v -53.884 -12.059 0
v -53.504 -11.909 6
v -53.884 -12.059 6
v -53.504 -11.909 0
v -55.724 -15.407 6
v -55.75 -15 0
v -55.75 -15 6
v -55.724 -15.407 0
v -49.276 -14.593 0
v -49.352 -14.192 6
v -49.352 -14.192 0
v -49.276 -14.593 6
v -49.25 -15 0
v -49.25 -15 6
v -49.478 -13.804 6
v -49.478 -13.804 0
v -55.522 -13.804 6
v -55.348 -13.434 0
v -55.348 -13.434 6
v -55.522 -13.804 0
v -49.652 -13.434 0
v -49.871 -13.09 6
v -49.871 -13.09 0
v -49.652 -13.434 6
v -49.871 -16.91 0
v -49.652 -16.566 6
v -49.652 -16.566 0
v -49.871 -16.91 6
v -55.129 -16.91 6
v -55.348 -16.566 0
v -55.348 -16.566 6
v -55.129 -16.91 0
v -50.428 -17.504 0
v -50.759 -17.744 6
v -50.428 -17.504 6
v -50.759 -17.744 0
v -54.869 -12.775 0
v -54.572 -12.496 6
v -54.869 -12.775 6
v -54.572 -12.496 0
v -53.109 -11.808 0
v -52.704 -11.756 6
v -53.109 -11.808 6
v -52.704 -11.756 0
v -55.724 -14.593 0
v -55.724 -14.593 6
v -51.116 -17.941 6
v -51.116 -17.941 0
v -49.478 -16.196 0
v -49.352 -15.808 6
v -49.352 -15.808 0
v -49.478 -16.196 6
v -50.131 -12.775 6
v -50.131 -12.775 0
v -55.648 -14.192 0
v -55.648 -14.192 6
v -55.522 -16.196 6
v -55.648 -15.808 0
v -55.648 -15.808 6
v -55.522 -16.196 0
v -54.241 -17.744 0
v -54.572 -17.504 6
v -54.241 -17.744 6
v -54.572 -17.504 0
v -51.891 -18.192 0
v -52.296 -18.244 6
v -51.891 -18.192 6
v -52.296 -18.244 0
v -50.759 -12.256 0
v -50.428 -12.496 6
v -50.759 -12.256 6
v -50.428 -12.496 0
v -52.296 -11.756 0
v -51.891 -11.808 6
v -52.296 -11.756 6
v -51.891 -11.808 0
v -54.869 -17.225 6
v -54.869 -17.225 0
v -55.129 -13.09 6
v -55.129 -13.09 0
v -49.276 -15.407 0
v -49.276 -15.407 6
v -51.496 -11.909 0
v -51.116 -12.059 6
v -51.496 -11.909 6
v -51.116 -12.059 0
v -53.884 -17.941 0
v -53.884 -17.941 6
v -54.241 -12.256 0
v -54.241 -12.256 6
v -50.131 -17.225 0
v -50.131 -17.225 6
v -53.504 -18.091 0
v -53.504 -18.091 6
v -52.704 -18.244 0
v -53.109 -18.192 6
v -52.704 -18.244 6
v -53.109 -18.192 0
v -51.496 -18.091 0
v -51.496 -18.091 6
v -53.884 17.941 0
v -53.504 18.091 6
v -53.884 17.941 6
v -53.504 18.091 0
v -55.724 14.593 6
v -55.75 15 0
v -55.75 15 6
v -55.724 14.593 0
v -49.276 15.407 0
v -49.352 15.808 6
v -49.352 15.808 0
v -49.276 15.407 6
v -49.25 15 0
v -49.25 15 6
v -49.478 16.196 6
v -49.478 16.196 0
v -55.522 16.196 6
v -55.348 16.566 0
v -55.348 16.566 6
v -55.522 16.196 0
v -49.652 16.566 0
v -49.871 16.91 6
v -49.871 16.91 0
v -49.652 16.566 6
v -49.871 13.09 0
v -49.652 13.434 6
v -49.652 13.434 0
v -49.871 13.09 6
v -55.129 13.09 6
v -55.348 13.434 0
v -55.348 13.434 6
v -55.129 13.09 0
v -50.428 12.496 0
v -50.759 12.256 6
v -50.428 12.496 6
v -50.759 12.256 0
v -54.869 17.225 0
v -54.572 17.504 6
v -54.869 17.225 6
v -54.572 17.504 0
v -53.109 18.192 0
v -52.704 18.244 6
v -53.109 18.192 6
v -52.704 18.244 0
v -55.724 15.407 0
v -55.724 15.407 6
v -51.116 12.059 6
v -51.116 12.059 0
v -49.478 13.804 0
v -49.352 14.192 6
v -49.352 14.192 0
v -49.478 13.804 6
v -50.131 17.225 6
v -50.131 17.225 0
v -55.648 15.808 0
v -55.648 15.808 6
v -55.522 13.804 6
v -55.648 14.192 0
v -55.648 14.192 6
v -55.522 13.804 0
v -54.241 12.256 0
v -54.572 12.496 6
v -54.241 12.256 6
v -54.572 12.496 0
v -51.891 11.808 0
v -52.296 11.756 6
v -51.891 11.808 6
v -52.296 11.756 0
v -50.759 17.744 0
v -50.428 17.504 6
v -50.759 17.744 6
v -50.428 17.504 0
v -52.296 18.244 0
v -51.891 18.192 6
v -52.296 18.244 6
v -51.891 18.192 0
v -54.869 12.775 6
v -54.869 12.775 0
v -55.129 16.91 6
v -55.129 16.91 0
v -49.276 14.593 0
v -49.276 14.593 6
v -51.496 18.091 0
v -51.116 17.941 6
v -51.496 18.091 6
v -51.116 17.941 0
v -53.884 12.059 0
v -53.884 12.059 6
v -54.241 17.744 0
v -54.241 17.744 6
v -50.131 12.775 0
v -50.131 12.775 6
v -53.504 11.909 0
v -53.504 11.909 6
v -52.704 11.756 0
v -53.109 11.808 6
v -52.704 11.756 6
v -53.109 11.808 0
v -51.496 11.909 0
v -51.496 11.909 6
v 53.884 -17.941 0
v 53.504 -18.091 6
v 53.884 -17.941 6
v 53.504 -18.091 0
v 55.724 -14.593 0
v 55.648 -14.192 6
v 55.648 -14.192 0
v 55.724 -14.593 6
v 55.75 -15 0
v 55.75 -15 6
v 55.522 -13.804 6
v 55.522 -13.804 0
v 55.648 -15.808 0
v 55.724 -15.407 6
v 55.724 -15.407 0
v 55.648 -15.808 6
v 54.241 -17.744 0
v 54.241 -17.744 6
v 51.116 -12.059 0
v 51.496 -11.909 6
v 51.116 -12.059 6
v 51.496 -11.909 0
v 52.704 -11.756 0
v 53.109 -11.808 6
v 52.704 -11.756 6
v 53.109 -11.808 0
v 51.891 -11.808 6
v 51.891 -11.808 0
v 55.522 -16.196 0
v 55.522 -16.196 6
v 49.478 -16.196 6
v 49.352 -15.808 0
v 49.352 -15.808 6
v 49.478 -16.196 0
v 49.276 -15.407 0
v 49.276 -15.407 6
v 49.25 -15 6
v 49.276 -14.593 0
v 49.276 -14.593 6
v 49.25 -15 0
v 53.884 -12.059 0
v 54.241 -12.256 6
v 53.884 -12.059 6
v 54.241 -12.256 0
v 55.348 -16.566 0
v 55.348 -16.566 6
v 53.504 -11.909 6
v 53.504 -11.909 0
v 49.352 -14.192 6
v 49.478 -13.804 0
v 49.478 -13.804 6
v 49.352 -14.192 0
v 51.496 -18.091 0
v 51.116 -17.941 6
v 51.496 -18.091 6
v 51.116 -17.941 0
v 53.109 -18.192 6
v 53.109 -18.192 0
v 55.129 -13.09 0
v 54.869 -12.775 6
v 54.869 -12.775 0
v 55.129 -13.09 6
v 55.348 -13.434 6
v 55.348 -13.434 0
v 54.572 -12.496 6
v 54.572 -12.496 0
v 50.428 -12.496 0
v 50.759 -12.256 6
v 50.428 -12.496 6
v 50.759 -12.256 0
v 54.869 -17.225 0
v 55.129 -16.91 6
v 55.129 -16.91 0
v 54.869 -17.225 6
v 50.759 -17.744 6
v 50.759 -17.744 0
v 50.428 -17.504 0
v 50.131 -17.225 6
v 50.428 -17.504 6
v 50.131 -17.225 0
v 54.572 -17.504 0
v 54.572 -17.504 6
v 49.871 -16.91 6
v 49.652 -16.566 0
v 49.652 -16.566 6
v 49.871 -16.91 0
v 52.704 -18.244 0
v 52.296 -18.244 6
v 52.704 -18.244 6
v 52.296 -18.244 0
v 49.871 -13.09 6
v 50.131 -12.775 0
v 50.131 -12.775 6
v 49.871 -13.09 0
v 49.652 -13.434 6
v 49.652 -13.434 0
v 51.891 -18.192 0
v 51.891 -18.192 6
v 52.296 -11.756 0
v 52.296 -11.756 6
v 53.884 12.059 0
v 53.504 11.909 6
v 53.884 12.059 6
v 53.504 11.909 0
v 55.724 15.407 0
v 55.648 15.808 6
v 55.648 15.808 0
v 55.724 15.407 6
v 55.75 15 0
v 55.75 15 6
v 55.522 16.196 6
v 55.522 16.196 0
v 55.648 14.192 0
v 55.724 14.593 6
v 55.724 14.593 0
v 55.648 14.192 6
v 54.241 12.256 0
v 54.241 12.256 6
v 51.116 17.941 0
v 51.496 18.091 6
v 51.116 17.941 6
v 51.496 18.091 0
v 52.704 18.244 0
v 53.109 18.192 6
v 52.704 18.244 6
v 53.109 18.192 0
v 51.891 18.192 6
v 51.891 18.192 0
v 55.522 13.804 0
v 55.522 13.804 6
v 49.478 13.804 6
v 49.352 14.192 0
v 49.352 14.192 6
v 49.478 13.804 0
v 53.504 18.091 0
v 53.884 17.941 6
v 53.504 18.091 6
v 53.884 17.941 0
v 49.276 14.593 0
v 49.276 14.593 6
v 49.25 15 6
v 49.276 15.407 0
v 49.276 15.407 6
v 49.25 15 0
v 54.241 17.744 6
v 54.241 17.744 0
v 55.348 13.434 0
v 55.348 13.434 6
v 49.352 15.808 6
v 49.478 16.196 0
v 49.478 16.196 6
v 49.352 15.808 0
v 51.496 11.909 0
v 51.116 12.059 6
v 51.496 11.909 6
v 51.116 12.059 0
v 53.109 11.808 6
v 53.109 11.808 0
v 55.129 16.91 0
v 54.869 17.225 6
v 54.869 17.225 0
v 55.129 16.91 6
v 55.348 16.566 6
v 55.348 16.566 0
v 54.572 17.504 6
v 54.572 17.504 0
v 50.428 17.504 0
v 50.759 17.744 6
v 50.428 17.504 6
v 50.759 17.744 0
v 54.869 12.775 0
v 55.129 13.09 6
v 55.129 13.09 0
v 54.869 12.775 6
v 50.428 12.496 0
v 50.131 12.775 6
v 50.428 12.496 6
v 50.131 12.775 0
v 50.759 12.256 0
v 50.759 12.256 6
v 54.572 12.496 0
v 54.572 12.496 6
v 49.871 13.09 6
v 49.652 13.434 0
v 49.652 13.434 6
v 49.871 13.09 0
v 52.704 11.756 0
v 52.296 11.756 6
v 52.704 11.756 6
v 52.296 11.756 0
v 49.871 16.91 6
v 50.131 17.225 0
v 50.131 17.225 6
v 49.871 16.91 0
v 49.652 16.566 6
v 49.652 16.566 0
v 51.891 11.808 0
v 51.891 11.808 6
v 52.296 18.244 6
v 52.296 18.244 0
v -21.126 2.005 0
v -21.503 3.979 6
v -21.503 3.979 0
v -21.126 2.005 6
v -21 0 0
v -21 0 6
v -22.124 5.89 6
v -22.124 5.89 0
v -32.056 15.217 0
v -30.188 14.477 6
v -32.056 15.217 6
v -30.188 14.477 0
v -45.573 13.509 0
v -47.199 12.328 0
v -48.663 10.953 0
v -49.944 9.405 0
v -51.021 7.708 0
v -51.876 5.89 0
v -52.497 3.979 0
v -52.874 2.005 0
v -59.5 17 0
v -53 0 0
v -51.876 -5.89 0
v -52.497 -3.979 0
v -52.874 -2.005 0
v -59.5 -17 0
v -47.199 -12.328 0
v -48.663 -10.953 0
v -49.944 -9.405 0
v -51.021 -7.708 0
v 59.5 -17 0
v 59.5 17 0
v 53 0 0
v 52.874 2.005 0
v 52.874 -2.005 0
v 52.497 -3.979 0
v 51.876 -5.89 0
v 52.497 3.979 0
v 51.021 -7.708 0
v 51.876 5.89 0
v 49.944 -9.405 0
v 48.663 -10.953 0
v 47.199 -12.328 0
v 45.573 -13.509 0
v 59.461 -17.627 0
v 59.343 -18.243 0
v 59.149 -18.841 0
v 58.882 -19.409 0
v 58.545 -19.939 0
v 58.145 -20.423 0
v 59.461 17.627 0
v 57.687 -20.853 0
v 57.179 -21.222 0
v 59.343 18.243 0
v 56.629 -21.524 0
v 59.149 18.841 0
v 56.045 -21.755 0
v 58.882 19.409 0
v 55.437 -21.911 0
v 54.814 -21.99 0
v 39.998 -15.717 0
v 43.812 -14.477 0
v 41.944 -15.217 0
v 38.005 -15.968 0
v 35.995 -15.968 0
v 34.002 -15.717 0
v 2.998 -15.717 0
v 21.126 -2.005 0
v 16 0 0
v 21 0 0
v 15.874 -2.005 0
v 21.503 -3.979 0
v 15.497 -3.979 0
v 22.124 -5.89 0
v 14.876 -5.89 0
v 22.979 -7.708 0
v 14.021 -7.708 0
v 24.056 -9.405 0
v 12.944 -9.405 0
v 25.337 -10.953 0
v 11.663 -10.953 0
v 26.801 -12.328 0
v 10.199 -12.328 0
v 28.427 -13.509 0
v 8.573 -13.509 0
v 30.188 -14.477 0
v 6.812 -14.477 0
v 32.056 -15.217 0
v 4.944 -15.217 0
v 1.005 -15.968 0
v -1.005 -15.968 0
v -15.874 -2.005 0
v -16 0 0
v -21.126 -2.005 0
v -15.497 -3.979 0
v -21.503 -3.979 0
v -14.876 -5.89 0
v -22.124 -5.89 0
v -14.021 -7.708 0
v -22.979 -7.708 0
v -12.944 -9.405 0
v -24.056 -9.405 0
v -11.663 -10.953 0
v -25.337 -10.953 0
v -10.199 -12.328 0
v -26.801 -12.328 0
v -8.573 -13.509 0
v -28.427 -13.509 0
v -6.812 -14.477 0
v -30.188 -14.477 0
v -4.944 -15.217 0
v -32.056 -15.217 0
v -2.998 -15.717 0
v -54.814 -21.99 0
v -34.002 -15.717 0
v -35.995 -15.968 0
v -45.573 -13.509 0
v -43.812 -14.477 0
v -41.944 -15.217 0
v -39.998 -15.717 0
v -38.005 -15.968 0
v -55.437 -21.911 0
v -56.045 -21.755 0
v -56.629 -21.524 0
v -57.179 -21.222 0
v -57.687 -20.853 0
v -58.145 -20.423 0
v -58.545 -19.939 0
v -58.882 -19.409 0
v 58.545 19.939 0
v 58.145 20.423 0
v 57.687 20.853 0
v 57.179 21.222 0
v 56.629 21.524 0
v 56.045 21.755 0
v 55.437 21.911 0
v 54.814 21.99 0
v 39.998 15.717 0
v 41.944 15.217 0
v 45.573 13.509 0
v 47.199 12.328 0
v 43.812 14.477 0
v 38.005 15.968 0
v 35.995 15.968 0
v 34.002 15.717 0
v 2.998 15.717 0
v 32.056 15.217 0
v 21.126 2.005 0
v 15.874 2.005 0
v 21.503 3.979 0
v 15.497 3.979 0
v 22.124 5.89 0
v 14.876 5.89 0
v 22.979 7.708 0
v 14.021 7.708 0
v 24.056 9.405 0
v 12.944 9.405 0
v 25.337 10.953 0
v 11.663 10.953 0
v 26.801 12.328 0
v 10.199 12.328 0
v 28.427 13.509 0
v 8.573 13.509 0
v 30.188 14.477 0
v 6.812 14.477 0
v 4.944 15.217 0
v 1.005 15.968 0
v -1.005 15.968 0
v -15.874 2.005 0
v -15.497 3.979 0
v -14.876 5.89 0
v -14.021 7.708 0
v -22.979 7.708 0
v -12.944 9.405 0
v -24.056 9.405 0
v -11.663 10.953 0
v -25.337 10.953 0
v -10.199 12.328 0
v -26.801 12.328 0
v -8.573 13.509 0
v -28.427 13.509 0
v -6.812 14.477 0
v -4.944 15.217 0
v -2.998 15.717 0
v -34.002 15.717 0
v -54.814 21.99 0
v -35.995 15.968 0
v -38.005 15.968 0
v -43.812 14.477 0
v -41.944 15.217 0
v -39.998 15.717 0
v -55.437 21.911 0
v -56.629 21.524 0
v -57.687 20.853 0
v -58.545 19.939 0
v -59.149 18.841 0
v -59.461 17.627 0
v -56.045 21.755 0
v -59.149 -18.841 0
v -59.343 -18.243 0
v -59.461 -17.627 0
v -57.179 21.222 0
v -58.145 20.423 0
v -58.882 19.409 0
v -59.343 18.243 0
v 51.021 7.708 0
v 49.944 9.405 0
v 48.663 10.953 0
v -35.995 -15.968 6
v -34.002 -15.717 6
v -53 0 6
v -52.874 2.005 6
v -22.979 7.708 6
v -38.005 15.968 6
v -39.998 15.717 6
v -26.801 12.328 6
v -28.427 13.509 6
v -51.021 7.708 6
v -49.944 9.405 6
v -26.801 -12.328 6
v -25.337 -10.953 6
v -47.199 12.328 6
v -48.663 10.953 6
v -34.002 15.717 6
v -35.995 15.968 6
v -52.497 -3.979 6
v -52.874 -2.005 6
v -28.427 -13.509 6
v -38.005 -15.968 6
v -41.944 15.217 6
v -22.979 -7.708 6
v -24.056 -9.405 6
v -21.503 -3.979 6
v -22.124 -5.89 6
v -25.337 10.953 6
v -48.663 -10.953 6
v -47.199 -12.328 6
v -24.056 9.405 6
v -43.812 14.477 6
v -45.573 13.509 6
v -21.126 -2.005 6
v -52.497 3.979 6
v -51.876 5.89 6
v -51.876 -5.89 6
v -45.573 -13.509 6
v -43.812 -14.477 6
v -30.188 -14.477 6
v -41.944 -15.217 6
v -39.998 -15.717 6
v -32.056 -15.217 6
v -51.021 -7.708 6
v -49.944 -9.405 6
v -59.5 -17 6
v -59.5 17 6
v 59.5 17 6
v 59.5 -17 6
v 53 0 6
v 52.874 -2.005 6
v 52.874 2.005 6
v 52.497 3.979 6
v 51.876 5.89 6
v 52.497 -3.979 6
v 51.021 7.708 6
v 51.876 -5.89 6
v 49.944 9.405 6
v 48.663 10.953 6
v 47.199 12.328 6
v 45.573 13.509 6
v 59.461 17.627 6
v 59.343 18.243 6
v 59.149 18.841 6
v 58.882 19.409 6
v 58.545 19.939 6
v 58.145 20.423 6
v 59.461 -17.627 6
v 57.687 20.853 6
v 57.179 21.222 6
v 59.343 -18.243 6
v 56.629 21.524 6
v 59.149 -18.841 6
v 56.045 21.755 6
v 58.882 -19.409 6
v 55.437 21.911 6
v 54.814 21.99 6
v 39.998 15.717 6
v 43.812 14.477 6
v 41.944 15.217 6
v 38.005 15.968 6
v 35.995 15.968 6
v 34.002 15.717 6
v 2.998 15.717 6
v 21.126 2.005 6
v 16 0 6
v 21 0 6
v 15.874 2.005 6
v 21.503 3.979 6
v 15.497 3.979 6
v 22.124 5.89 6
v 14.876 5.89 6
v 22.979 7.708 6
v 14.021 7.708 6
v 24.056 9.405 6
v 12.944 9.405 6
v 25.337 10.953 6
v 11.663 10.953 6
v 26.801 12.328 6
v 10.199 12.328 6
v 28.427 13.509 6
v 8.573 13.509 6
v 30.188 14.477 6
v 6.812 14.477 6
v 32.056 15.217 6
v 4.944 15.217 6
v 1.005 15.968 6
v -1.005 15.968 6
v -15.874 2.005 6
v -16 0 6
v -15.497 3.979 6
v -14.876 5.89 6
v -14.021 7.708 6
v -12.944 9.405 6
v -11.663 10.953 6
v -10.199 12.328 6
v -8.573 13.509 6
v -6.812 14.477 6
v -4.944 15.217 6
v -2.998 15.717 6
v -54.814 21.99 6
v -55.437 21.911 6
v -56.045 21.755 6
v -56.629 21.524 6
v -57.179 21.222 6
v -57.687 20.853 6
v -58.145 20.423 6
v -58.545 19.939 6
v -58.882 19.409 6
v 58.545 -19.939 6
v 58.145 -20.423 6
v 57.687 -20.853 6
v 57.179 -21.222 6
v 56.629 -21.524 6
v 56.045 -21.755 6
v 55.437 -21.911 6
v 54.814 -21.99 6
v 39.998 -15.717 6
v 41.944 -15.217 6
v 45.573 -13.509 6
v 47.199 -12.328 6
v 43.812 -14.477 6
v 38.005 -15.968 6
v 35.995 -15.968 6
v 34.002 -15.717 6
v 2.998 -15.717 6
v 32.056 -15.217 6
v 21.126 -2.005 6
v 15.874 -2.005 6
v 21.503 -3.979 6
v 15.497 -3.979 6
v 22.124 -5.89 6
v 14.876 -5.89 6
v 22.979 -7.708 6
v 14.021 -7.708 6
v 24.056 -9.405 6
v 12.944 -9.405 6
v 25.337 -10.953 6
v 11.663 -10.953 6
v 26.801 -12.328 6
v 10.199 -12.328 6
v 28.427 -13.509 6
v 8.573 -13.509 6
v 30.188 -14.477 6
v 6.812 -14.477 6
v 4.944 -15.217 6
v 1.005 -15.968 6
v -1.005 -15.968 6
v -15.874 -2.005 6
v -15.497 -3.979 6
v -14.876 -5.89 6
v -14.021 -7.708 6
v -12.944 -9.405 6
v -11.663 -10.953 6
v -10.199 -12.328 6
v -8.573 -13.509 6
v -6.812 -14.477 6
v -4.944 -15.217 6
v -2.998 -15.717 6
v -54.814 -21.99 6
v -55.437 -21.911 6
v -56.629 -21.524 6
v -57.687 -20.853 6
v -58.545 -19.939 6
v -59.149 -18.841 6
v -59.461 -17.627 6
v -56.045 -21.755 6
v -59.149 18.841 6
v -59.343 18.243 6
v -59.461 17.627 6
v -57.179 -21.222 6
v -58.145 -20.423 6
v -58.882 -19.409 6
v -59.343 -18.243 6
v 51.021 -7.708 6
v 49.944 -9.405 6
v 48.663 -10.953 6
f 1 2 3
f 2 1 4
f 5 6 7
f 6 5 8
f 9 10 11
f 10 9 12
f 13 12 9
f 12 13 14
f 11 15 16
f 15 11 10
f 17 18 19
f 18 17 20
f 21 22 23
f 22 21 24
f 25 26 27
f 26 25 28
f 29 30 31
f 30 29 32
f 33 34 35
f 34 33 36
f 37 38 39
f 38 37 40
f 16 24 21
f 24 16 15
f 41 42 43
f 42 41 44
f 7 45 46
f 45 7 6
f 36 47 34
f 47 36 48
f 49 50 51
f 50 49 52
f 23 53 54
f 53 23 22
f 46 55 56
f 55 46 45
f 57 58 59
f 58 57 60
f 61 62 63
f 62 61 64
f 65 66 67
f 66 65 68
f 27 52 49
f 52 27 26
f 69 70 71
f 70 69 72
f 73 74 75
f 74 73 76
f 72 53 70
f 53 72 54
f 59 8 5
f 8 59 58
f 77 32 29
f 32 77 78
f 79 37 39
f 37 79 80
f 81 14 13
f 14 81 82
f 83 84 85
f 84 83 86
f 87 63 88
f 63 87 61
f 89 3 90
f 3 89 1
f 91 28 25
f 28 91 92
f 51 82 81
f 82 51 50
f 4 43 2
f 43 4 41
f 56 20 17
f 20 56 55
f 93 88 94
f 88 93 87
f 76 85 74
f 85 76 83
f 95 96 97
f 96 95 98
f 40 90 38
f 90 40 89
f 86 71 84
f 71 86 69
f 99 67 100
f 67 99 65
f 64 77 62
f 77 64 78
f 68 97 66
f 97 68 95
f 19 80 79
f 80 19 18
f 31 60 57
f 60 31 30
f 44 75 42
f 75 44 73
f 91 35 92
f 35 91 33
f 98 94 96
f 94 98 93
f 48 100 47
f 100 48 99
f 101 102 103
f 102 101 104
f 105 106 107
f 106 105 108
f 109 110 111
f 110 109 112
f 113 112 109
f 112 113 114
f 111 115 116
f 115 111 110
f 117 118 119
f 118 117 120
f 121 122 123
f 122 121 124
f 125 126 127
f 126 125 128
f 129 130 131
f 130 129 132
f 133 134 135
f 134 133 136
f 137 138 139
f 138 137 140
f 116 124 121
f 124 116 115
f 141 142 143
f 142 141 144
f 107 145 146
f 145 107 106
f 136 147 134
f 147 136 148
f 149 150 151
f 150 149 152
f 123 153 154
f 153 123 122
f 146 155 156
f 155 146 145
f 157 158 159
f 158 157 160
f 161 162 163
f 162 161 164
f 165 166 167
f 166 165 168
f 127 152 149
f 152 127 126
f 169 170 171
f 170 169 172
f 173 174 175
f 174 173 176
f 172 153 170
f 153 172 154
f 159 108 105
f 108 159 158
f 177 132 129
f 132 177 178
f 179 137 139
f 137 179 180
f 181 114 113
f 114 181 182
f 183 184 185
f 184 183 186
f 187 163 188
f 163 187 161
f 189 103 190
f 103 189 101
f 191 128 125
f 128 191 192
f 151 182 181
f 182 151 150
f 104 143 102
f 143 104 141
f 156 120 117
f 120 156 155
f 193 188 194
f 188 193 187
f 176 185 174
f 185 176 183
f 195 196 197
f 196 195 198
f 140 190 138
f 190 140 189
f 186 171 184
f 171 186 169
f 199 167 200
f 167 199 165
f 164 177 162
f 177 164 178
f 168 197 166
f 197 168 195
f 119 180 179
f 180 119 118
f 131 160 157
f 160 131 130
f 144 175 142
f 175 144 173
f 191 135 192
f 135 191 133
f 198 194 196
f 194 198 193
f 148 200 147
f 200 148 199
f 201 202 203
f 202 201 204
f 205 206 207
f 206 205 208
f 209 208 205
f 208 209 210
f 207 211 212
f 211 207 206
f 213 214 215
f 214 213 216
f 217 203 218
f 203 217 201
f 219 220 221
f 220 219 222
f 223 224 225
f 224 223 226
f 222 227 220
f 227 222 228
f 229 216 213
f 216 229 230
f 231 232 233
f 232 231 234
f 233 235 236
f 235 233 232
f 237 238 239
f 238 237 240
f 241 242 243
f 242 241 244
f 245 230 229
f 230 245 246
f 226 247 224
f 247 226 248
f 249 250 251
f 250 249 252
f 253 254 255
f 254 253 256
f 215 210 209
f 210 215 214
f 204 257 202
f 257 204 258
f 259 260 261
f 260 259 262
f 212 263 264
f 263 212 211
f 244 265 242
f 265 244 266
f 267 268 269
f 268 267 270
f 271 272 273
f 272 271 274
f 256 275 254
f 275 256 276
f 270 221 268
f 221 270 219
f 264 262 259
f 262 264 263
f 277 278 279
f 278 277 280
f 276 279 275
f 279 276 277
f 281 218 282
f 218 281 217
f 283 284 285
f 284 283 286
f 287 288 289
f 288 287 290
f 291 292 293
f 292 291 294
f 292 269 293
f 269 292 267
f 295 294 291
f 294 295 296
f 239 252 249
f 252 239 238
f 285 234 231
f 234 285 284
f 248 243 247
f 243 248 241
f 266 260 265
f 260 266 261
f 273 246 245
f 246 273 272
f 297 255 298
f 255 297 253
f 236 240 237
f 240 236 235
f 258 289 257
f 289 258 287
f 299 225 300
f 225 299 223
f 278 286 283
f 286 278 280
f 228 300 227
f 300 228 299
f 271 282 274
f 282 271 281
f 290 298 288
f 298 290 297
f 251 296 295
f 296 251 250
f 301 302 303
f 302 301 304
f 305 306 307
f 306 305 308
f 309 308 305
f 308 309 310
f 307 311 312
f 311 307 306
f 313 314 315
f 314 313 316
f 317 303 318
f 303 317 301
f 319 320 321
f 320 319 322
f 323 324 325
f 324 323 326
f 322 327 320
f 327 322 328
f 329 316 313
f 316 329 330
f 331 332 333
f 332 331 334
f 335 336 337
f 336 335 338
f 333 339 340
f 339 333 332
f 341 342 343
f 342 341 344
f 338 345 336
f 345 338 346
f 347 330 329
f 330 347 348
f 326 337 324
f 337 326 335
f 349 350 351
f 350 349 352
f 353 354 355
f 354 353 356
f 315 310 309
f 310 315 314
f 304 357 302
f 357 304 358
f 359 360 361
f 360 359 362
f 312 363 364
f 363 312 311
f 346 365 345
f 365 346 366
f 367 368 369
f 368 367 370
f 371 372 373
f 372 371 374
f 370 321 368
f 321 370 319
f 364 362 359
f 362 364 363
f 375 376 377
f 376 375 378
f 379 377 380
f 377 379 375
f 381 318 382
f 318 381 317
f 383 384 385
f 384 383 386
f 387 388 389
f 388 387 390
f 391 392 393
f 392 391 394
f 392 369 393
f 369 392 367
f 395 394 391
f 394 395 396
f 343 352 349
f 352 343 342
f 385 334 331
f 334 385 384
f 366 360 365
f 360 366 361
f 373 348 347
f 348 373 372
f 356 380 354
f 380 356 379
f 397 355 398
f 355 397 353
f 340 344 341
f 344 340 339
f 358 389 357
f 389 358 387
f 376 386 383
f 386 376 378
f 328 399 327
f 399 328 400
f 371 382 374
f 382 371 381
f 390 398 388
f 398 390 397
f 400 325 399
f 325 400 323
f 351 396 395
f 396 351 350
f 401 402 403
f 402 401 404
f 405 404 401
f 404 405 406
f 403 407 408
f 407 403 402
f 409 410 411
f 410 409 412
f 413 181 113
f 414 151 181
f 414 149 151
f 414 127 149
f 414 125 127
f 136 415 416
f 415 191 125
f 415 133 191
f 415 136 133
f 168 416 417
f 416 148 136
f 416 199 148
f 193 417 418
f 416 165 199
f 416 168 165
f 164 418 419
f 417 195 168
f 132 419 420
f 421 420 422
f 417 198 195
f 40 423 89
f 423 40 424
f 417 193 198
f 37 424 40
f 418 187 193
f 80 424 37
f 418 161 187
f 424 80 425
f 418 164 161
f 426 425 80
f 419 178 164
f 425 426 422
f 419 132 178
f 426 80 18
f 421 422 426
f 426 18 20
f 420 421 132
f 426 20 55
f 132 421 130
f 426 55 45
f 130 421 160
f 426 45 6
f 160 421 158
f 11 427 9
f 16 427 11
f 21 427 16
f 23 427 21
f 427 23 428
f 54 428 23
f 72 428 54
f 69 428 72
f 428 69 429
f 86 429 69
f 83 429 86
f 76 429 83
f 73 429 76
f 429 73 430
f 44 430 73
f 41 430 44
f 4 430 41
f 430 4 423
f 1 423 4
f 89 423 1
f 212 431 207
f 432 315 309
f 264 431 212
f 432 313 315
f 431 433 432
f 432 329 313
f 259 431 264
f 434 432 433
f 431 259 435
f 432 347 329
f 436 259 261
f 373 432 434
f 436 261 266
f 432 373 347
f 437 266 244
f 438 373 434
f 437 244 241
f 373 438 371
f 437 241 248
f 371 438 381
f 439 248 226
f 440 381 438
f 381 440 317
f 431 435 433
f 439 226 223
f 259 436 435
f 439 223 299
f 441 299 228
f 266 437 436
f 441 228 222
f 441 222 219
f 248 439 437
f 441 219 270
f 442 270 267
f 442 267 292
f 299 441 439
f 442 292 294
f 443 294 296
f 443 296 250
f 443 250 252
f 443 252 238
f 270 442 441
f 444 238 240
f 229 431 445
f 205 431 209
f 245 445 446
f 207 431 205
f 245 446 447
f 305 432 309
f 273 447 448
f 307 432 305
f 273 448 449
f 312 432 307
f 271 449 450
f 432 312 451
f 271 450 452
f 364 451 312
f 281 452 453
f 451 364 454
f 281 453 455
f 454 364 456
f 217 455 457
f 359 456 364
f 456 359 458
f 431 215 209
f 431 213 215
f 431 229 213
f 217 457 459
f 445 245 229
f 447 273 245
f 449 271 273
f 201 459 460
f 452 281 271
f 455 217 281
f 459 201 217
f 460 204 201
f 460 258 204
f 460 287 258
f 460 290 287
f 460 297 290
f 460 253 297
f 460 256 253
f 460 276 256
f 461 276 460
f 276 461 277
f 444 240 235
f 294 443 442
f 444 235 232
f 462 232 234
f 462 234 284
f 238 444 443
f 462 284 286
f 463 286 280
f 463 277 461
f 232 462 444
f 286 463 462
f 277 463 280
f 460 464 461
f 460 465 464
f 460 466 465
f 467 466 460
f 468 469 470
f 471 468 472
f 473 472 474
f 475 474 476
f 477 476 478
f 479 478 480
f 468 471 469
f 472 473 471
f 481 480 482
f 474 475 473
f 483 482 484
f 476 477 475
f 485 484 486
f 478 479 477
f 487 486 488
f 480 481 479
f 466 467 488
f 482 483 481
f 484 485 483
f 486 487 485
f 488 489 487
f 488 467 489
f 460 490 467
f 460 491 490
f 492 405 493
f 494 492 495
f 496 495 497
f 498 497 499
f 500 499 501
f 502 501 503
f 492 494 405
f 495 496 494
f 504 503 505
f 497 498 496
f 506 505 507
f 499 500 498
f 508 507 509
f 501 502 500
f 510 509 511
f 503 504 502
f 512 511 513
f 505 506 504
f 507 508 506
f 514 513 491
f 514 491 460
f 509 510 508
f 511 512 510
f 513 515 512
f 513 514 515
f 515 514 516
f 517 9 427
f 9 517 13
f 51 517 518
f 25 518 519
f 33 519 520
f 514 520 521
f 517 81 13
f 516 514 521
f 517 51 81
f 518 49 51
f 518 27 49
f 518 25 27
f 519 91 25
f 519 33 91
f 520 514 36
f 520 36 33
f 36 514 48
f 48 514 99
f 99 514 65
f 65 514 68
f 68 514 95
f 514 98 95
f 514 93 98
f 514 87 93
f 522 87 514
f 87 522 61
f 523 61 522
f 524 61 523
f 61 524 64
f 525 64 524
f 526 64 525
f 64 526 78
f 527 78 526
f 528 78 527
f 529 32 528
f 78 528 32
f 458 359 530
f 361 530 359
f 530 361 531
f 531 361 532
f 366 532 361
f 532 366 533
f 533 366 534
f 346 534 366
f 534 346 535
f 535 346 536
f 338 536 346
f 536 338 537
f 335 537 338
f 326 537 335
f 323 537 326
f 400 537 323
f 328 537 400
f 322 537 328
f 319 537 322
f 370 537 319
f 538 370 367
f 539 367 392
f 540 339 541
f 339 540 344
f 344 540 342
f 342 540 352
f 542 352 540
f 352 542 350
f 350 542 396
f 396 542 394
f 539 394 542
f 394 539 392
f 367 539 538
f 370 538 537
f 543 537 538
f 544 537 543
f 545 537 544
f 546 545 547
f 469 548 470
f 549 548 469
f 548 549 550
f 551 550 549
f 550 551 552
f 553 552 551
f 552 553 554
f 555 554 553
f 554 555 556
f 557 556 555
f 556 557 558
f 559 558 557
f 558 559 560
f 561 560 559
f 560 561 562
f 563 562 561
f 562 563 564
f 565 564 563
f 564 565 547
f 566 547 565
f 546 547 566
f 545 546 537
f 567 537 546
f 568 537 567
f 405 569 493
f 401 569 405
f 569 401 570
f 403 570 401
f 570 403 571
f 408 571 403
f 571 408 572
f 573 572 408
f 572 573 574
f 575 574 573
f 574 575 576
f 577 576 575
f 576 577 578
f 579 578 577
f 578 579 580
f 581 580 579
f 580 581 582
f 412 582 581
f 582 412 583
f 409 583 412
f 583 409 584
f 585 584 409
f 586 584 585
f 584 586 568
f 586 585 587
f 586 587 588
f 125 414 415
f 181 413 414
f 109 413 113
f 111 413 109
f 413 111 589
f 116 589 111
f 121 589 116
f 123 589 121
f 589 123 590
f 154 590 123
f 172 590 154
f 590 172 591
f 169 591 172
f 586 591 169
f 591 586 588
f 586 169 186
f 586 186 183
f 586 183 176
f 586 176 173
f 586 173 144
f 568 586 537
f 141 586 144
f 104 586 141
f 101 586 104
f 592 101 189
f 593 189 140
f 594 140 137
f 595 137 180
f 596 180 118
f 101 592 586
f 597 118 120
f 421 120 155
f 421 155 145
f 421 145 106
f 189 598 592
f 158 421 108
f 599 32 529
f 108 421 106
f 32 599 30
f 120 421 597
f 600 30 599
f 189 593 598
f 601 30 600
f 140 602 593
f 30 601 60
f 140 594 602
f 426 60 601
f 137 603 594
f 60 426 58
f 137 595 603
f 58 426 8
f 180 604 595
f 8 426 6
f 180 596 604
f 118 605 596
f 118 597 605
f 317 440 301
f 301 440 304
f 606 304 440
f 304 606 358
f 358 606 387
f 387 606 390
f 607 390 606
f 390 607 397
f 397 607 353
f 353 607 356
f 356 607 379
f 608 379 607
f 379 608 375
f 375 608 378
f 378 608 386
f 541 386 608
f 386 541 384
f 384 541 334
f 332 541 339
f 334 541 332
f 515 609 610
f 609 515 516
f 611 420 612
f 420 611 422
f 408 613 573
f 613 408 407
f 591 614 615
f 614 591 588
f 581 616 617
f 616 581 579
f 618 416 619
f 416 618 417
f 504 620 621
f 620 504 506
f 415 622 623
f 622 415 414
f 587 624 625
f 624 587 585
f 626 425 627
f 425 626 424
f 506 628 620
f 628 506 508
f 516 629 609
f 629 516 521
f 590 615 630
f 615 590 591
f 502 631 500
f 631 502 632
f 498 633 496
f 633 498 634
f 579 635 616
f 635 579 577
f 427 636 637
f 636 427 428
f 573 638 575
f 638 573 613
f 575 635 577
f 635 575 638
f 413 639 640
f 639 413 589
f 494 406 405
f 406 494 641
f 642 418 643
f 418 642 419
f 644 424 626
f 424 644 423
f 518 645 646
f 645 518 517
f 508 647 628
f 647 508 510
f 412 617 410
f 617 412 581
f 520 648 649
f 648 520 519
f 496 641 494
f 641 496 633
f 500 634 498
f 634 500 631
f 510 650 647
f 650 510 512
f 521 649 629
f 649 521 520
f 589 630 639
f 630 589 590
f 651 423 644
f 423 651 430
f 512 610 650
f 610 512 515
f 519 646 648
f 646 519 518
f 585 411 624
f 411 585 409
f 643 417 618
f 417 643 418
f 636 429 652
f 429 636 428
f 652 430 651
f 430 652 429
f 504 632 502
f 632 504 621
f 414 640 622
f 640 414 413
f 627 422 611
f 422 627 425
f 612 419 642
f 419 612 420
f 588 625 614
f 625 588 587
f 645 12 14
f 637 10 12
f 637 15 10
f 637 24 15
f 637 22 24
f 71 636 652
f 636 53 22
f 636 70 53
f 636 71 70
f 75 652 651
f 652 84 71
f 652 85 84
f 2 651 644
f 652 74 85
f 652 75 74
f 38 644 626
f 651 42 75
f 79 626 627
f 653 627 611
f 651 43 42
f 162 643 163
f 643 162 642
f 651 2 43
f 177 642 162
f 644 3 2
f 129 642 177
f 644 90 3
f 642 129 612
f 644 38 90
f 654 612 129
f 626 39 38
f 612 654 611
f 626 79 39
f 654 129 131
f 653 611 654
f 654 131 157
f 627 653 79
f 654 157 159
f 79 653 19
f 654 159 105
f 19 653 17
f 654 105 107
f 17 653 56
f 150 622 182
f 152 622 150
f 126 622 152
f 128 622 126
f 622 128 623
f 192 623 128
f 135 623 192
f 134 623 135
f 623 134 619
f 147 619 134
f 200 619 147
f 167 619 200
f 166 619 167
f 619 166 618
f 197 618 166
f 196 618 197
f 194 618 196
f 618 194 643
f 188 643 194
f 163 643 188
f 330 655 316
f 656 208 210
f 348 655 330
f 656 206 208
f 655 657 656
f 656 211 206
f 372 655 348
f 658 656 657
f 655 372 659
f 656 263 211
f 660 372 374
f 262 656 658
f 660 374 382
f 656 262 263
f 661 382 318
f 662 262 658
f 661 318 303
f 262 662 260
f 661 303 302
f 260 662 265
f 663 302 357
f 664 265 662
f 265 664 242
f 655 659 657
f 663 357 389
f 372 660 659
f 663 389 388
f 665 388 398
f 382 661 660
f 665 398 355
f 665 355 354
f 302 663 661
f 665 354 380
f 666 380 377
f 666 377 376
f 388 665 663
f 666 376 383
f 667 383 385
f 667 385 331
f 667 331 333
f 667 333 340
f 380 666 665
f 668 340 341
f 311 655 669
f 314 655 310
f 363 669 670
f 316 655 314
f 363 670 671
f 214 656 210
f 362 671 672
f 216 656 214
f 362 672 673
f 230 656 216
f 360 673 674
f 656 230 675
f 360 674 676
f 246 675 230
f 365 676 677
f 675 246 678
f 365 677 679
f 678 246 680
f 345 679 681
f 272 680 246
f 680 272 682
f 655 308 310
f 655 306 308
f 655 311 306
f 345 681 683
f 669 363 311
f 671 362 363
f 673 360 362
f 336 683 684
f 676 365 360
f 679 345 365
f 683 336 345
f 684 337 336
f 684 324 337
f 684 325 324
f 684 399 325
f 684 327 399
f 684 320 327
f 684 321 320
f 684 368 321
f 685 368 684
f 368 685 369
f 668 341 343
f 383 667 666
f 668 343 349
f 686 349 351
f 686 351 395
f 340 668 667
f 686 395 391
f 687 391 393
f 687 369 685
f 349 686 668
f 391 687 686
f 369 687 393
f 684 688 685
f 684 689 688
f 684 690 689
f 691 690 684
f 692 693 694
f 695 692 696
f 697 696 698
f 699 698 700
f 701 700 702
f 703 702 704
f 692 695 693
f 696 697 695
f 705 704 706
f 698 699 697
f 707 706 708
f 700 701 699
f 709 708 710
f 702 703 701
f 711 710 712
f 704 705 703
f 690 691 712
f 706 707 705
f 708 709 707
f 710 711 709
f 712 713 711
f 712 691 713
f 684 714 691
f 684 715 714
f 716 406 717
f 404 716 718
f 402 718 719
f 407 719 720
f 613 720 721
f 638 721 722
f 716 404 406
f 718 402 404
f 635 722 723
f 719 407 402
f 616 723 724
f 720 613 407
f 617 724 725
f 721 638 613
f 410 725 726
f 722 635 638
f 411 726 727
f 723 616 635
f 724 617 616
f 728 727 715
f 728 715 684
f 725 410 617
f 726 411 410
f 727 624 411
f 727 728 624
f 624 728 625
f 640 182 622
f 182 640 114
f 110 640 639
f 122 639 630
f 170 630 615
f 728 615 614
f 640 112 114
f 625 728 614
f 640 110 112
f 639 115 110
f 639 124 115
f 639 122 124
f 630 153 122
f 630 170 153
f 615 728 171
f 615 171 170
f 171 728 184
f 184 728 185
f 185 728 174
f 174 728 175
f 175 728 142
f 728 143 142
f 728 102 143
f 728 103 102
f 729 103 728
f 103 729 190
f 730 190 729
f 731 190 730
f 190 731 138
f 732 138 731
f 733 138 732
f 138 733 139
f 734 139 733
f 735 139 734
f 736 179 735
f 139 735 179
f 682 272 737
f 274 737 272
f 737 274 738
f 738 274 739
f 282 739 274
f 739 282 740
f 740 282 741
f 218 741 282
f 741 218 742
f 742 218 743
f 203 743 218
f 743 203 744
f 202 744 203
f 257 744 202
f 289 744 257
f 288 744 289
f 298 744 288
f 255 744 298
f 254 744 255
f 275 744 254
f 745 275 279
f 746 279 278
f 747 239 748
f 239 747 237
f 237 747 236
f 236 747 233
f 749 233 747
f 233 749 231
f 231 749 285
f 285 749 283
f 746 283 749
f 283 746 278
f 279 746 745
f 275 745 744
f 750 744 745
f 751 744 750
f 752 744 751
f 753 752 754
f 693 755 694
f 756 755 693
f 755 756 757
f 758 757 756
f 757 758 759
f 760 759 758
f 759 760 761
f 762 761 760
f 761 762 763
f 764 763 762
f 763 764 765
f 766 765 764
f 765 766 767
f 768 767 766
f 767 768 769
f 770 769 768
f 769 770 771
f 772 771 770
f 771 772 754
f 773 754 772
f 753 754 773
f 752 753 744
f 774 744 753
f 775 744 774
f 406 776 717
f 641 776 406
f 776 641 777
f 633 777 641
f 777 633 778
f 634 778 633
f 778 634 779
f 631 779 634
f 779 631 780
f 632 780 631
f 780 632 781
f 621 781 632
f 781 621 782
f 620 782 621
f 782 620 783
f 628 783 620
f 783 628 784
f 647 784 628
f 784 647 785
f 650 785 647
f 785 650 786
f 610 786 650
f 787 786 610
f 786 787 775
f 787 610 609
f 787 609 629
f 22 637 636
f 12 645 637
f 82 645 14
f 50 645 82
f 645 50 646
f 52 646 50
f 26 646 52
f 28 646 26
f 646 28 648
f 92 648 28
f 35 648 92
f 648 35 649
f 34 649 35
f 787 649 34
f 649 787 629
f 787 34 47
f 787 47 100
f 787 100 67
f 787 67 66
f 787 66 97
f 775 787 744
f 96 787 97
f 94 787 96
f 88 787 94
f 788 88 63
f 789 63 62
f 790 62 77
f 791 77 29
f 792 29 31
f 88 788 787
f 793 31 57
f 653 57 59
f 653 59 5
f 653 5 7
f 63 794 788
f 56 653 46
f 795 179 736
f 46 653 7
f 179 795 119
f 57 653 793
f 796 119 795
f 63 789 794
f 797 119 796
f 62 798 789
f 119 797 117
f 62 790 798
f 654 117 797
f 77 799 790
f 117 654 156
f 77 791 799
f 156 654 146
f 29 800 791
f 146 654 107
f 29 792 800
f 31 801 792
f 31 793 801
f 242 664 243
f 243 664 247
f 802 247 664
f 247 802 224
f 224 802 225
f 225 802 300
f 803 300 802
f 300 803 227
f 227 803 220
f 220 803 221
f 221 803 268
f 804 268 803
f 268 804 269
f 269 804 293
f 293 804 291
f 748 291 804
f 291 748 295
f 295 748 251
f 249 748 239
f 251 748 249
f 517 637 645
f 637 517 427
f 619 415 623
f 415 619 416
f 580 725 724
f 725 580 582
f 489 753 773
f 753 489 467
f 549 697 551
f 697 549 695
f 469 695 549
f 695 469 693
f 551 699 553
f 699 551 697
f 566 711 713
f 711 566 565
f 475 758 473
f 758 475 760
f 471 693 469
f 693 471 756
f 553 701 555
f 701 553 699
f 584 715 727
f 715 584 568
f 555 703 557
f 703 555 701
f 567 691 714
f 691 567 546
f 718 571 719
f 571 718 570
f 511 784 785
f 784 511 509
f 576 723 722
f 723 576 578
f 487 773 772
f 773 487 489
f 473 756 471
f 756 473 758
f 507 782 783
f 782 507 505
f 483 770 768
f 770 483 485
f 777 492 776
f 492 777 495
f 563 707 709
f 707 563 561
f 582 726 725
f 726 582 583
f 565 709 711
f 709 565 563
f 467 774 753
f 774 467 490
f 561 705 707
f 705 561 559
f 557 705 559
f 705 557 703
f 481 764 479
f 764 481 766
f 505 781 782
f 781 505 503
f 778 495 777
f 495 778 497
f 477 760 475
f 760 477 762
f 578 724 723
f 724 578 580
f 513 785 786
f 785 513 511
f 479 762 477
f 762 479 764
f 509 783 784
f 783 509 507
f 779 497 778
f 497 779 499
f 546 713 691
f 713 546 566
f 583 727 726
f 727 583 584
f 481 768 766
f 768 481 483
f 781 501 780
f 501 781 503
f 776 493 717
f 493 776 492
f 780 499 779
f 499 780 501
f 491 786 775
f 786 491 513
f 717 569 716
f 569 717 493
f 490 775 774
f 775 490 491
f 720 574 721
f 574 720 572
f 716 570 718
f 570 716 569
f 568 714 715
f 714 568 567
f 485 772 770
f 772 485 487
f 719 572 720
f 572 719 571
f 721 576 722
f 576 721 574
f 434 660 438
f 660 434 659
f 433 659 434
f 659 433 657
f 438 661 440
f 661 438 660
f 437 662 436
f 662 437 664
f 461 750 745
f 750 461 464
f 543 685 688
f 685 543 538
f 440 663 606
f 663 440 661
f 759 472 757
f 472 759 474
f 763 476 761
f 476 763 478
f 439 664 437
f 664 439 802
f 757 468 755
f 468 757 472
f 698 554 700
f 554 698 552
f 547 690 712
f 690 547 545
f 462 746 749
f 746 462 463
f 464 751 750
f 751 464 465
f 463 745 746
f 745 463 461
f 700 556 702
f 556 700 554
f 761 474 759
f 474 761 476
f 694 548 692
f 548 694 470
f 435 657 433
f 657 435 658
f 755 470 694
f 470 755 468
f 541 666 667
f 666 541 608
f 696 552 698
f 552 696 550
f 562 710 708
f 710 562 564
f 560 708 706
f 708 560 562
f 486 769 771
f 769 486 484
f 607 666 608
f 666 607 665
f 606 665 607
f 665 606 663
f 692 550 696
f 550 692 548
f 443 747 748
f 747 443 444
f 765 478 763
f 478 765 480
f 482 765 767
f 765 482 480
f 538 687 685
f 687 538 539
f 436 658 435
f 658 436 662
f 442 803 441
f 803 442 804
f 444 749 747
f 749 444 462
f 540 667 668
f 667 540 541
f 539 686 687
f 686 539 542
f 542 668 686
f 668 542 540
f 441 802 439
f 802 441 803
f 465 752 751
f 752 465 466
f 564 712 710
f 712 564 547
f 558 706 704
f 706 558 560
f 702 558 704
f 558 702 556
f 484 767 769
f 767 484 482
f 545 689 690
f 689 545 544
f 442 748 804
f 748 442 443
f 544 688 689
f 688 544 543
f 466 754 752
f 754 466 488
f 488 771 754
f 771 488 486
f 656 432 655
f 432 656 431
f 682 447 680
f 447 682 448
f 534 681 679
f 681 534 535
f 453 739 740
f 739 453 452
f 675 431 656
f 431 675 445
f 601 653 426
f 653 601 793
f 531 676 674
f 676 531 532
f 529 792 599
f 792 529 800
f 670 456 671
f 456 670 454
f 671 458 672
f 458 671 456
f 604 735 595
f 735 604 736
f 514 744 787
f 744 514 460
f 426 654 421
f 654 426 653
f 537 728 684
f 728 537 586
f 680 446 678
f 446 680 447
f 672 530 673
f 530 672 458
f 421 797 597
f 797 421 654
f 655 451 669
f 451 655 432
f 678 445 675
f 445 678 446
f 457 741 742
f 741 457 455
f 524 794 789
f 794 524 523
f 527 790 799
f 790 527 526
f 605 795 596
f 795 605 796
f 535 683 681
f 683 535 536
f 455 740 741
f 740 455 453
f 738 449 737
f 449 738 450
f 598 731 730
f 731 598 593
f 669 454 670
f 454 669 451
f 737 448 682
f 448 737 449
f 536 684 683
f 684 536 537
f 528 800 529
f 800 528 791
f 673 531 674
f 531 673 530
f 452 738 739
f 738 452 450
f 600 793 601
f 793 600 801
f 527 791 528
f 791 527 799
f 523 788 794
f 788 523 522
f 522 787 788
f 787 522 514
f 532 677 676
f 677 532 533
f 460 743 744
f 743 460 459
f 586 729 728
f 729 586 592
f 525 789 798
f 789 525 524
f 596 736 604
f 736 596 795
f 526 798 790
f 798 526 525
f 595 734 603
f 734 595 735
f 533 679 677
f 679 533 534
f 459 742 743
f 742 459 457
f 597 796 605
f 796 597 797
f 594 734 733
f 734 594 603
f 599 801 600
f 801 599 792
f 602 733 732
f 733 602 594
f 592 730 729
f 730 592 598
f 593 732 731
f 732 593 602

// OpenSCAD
$fn = 50;


difference() {
	union() {
		hull() {
			translate(v = [-54.5000000000, 17.0000000000, 0]) {
				cylinder(h = 6, r = 5);
			}
			translate(v = [54.5000000000, 17.0000000000, 0]) {
				cylinder(h = 6, r = 5);
			}
			translate(v = [-54.5000000000, -17.0000000000, 0]) {
				cylinder(h = 6, r = 5);
			}
			translate(v = [54.5000000000, -17.0000000000, 0]) {
				cylinder(h = 6, r = 5);
			}
		}
	}
	union() {
		#translate(v = [-52.5000000000, -15.0000000000, -100.0000000000]) {
			cylinder(h = 200, r = 3.2500000000);
		}
		#translate(v = [-52.5000000000, 15.0000000000, -100.0000000000]) {
			cylinder(h = 200, r = 3.2500000000);
		}
		#translate(v = [52.5000000000, -15.0000000000, -100.0000000000]) {
			cylinder(h = 200, r = 3.2500000000);
		}
		#translate(v = [52.5000000000, 15.0000000000, -100.0000000000]) {
			cylinder(h = 200, r = 3.2500000000);
		}
		#translate(v = [-37.0000000000, 0, 0]) {
			cylinder(h = 6, r = 16.0000000000);
		}
		#cylinder(h = 6, r = 16.0000000000);
		#translate(v = [37.0000000000, 0, 0]) {
			cylinder(h = 6, r = 16.0000000000);
		}
	}
}
